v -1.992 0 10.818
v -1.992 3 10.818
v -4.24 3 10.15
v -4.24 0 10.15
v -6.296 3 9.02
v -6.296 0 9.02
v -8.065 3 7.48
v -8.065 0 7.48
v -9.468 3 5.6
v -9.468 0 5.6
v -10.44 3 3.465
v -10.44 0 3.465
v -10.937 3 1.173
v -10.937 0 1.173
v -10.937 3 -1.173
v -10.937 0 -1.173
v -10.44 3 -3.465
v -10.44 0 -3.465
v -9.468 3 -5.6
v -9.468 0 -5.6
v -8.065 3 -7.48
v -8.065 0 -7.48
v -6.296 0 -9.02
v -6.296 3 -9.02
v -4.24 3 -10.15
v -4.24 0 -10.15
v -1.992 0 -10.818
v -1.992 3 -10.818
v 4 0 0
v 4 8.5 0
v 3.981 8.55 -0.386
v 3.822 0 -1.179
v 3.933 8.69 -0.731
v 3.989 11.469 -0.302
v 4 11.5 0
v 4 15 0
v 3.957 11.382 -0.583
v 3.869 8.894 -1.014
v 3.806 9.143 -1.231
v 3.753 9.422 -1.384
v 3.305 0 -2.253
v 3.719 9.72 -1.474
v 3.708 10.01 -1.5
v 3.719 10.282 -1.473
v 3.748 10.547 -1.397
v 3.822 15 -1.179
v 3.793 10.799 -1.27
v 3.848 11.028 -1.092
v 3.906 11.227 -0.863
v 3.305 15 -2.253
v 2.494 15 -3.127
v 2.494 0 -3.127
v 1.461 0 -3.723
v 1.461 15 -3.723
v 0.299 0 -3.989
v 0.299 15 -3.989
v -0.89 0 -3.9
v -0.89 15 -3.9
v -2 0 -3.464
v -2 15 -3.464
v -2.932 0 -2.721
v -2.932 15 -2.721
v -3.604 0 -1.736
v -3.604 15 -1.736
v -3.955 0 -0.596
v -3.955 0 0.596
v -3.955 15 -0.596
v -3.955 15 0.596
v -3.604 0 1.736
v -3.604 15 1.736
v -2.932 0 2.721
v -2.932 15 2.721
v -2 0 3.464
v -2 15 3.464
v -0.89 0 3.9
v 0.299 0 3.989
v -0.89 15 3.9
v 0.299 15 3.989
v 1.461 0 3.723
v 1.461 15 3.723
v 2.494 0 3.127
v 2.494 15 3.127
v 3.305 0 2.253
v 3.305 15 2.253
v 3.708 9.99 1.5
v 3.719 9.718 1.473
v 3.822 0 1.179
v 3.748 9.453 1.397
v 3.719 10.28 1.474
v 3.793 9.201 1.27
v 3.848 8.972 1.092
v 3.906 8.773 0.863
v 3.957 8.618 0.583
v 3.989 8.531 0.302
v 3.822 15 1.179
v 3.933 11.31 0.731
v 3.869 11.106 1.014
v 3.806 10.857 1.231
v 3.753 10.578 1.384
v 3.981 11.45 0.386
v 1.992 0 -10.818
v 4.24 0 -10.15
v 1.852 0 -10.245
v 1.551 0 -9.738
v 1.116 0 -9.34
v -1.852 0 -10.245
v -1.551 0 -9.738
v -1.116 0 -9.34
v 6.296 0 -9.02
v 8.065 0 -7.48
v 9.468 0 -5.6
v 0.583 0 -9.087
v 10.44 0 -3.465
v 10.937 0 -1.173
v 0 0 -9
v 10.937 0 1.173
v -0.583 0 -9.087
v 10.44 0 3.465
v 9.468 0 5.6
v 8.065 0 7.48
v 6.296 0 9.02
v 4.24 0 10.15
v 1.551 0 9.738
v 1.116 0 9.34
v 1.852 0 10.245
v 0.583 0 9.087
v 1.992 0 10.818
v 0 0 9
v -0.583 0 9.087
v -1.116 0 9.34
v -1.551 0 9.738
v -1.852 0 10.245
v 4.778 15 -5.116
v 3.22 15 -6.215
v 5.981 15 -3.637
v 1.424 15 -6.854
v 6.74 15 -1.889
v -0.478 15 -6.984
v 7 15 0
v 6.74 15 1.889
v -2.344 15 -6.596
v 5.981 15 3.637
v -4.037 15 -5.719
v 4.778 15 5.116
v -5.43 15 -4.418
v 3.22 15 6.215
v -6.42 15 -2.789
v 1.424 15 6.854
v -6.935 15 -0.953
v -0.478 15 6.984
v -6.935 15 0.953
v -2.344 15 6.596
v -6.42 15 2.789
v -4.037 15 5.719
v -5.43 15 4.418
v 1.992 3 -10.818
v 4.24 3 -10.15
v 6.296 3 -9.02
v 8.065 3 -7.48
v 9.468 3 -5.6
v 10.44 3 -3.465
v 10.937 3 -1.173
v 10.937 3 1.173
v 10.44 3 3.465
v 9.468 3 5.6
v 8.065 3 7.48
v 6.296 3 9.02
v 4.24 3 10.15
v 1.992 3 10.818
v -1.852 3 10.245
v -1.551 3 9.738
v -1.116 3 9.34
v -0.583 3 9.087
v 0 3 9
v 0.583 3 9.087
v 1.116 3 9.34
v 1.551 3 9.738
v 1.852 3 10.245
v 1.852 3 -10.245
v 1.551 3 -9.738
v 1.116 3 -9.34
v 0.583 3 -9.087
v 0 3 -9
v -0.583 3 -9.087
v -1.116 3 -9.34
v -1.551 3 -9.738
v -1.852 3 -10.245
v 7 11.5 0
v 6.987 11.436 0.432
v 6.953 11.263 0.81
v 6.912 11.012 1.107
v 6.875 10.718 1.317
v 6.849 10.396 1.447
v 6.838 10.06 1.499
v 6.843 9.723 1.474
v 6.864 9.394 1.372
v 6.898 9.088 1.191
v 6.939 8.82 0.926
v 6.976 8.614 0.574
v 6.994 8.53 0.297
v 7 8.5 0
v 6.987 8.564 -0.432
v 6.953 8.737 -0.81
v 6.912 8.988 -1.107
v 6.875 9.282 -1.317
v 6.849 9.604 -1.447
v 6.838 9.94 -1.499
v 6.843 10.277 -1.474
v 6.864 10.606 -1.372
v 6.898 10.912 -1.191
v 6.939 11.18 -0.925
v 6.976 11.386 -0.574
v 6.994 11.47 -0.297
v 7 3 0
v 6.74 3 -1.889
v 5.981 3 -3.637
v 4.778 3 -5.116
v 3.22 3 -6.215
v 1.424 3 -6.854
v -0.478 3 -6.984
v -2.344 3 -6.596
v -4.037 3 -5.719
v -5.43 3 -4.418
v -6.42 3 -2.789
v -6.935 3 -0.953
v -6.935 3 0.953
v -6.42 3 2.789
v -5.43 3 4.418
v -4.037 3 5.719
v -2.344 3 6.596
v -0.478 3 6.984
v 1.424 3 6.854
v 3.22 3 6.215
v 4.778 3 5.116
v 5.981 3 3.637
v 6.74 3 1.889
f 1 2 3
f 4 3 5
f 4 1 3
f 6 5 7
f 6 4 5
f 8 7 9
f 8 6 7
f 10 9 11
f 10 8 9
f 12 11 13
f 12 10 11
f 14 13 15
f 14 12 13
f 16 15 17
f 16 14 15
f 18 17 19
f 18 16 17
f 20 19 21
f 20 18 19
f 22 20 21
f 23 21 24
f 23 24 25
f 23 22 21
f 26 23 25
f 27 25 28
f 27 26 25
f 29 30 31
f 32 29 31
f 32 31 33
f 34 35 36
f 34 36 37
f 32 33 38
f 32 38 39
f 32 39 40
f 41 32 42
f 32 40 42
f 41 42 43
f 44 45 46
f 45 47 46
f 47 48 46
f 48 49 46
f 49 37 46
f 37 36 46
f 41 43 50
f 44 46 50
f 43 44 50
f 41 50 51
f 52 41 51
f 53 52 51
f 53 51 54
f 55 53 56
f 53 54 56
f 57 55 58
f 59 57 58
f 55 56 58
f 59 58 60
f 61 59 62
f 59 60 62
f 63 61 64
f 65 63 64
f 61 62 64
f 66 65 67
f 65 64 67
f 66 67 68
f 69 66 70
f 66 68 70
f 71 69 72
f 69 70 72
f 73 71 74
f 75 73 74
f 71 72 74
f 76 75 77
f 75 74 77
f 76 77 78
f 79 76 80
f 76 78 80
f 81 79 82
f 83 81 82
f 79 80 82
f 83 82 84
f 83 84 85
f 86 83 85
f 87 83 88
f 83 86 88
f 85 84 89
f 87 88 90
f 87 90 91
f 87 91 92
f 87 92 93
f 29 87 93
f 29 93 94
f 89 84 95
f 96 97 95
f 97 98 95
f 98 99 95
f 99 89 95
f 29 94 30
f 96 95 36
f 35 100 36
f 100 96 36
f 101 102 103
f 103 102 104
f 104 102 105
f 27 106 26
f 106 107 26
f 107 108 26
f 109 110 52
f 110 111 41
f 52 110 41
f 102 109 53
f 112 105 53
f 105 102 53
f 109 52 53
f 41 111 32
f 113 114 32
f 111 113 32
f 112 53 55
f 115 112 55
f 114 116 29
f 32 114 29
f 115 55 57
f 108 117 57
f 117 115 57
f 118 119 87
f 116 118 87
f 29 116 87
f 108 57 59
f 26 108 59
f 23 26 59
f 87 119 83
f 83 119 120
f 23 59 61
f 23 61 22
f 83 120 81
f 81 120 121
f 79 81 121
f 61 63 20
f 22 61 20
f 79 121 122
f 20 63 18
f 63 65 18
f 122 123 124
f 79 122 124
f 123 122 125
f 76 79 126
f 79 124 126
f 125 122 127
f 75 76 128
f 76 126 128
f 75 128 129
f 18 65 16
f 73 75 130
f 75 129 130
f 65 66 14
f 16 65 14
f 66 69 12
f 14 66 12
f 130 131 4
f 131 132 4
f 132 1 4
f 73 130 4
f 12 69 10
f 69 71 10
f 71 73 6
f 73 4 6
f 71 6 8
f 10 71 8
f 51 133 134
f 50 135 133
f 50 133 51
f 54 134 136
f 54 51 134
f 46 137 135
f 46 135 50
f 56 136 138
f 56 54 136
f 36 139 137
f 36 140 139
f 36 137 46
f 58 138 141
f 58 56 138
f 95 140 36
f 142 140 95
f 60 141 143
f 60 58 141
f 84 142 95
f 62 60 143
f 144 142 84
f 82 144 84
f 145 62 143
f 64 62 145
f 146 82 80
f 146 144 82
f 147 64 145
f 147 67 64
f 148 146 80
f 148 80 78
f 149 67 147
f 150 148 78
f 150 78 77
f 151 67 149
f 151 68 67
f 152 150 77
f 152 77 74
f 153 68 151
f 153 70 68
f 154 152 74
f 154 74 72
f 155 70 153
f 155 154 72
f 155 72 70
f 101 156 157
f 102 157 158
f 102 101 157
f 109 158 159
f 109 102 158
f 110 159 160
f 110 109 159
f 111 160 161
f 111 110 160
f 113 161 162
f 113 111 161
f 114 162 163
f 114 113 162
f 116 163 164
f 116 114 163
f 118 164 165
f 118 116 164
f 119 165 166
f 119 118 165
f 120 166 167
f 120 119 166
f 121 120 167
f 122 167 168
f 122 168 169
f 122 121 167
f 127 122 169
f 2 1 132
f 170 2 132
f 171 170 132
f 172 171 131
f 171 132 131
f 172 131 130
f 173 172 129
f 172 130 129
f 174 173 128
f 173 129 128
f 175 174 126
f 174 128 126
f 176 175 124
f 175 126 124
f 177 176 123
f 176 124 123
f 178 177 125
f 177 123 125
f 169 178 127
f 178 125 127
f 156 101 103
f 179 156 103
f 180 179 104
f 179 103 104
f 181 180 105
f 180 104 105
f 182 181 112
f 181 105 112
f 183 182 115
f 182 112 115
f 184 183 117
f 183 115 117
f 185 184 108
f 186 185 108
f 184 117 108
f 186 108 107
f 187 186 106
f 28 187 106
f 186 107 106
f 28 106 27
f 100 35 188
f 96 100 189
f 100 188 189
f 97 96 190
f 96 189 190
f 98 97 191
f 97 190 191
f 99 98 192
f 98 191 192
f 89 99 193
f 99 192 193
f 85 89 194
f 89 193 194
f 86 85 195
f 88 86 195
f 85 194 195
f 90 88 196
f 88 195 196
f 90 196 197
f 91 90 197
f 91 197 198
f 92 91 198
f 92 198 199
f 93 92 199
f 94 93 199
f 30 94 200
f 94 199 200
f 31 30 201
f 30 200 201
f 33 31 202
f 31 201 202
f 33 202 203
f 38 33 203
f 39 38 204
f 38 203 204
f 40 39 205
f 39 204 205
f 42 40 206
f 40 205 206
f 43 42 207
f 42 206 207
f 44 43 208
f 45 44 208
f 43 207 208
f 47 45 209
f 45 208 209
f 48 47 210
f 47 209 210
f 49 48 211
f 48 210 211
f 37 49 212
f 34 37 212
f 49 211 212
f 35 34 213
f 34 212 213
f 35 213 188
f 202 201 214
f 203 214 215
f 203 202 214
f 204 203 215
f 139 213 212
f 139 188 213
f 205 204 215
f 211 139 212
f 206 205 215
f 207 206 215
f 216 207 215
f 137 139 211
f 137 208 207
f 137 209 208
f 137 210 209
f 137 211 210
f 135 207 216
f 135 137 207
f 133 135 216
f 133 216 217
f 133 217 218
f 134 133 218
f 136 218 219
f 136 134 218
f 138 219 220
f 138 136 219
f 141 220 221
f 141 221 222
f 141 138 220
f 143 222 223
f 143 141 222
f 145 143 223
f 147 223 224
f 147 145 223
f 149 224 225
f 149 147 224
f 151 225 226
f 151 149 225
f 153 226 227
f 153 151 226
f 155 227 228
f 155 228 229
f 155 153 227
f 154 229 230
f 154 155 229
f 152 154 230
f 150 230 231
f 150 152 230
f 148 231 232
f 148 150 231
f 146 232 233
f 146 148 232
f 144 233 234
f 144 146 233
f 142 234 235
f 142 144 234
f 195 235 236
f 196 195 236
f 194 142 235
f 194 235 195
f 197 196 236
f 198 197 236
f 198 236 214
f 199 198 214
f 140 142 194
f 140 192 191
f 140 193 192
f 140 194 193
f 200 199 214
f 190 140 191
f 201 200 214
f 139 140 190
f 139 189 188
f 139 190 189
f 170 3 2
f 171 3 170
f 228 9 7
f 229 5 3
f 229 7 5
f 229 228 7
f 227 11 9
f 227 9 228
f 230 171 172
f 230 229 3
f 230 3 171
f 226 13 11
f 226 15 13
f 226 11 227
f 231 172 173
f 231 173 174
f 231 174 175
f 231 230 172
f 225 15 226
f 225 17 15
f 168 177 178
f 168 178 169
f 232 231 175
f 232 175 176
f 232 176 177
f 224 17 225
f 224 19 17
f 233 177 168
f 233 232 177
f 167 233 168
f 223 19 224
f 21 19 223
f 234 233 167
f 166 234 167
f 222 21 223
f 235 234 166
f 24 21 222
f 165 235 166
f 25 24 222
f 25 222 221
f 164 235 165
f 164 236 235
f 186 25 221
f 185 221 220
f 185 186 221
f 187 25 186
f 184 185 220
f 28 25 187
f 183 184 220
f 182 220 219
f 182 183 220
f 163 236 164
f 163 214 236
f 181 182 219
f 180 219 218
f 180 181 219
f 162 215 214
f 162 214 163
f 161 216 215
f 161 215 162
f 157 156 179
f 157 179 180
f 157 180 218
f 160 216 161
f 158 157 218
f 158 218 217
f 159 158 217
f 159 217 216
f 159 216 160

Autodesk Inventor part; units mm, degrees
ref_plane "XZ Plane" through (0, 0, 0) normal (0, 1, 0) x (-1, 0, 0)
ref_plane "XY Plane" through (0, 0, 0) normal (0, 0, 1) x (1, 0, 0)
sketch "Esquisse1" plane through (0, 0, 0) normal (0, 1, 0) x (-1, 0, 0)
  circle A0 centre (0, 0) radius 11
  dimension "d0" = 22
extrude "Extrusion1" add sketch "Esquisse1" along normal blind 15
sketch "Esquisse2" plane through (0, 15, 0) normal (0, 1, 0) x (1, 0, 0)
  circle A0 centre (0, 0) radius 11 projected
  circle A1 centre (0, 0) radius 7
  dimension "d3" = 14
extrude "Extrusion2" cut sketch "Esquisse2" against normal blind 12
sketch "Esquisse3" plane through (0, 15, 0) normal (0, 1, 0) x (1, 0, 0)
  circle A0 centre (0, 0) radius 7 projected
  circle A1 centre (0, 0) radius 4
  dimension "d6" = 8
extrude "Extrusion3" cut sketch "Esquisse3" against normal through all contours A1
sketch "Esquisse4" plane through (0, 0, 0) normal (0, -1, 0) x (1, 0, 0)
  circle A0 centre (0, 0) radius 11 projected
  circle A1 centre (0, 11) radius 2
  circle A2 centre (0, -11) radius 2
  dimension "d9" = 4
  dimension "d10" = 4
extrude "Extrusion4" cut sketch "Esquisse4" against normal through all contours A1 A0 | A0 A1 | A2 A0 | A0 A2
ref_plane "Plan de construction1" through (7, 15, 0) normal (1, 0, 0) x (0, 1, 0)
sketch "Esquisse5" plane through (7, 15, 0) normal (1, 0, 0) x (0, 1, 0)
  circle A0 centre (-5, 0) radius 1.5
  line L0 (0, -7) -> (0, 7) projected
  point P0 (-15, 0)
  dimension "d13" = 3
  dimension "d16" = 5
extrude "Extrusion5" cut sketch "Esquisse5" against normal blind 5
thread "Filetage1" size "M3x0.5" class "6H" standard "ANSI Metric M Profile" full length
equation "\"d10\" = d9"
properties part number "Raccord-Mat-Potence" material "Aluminium 6061"
